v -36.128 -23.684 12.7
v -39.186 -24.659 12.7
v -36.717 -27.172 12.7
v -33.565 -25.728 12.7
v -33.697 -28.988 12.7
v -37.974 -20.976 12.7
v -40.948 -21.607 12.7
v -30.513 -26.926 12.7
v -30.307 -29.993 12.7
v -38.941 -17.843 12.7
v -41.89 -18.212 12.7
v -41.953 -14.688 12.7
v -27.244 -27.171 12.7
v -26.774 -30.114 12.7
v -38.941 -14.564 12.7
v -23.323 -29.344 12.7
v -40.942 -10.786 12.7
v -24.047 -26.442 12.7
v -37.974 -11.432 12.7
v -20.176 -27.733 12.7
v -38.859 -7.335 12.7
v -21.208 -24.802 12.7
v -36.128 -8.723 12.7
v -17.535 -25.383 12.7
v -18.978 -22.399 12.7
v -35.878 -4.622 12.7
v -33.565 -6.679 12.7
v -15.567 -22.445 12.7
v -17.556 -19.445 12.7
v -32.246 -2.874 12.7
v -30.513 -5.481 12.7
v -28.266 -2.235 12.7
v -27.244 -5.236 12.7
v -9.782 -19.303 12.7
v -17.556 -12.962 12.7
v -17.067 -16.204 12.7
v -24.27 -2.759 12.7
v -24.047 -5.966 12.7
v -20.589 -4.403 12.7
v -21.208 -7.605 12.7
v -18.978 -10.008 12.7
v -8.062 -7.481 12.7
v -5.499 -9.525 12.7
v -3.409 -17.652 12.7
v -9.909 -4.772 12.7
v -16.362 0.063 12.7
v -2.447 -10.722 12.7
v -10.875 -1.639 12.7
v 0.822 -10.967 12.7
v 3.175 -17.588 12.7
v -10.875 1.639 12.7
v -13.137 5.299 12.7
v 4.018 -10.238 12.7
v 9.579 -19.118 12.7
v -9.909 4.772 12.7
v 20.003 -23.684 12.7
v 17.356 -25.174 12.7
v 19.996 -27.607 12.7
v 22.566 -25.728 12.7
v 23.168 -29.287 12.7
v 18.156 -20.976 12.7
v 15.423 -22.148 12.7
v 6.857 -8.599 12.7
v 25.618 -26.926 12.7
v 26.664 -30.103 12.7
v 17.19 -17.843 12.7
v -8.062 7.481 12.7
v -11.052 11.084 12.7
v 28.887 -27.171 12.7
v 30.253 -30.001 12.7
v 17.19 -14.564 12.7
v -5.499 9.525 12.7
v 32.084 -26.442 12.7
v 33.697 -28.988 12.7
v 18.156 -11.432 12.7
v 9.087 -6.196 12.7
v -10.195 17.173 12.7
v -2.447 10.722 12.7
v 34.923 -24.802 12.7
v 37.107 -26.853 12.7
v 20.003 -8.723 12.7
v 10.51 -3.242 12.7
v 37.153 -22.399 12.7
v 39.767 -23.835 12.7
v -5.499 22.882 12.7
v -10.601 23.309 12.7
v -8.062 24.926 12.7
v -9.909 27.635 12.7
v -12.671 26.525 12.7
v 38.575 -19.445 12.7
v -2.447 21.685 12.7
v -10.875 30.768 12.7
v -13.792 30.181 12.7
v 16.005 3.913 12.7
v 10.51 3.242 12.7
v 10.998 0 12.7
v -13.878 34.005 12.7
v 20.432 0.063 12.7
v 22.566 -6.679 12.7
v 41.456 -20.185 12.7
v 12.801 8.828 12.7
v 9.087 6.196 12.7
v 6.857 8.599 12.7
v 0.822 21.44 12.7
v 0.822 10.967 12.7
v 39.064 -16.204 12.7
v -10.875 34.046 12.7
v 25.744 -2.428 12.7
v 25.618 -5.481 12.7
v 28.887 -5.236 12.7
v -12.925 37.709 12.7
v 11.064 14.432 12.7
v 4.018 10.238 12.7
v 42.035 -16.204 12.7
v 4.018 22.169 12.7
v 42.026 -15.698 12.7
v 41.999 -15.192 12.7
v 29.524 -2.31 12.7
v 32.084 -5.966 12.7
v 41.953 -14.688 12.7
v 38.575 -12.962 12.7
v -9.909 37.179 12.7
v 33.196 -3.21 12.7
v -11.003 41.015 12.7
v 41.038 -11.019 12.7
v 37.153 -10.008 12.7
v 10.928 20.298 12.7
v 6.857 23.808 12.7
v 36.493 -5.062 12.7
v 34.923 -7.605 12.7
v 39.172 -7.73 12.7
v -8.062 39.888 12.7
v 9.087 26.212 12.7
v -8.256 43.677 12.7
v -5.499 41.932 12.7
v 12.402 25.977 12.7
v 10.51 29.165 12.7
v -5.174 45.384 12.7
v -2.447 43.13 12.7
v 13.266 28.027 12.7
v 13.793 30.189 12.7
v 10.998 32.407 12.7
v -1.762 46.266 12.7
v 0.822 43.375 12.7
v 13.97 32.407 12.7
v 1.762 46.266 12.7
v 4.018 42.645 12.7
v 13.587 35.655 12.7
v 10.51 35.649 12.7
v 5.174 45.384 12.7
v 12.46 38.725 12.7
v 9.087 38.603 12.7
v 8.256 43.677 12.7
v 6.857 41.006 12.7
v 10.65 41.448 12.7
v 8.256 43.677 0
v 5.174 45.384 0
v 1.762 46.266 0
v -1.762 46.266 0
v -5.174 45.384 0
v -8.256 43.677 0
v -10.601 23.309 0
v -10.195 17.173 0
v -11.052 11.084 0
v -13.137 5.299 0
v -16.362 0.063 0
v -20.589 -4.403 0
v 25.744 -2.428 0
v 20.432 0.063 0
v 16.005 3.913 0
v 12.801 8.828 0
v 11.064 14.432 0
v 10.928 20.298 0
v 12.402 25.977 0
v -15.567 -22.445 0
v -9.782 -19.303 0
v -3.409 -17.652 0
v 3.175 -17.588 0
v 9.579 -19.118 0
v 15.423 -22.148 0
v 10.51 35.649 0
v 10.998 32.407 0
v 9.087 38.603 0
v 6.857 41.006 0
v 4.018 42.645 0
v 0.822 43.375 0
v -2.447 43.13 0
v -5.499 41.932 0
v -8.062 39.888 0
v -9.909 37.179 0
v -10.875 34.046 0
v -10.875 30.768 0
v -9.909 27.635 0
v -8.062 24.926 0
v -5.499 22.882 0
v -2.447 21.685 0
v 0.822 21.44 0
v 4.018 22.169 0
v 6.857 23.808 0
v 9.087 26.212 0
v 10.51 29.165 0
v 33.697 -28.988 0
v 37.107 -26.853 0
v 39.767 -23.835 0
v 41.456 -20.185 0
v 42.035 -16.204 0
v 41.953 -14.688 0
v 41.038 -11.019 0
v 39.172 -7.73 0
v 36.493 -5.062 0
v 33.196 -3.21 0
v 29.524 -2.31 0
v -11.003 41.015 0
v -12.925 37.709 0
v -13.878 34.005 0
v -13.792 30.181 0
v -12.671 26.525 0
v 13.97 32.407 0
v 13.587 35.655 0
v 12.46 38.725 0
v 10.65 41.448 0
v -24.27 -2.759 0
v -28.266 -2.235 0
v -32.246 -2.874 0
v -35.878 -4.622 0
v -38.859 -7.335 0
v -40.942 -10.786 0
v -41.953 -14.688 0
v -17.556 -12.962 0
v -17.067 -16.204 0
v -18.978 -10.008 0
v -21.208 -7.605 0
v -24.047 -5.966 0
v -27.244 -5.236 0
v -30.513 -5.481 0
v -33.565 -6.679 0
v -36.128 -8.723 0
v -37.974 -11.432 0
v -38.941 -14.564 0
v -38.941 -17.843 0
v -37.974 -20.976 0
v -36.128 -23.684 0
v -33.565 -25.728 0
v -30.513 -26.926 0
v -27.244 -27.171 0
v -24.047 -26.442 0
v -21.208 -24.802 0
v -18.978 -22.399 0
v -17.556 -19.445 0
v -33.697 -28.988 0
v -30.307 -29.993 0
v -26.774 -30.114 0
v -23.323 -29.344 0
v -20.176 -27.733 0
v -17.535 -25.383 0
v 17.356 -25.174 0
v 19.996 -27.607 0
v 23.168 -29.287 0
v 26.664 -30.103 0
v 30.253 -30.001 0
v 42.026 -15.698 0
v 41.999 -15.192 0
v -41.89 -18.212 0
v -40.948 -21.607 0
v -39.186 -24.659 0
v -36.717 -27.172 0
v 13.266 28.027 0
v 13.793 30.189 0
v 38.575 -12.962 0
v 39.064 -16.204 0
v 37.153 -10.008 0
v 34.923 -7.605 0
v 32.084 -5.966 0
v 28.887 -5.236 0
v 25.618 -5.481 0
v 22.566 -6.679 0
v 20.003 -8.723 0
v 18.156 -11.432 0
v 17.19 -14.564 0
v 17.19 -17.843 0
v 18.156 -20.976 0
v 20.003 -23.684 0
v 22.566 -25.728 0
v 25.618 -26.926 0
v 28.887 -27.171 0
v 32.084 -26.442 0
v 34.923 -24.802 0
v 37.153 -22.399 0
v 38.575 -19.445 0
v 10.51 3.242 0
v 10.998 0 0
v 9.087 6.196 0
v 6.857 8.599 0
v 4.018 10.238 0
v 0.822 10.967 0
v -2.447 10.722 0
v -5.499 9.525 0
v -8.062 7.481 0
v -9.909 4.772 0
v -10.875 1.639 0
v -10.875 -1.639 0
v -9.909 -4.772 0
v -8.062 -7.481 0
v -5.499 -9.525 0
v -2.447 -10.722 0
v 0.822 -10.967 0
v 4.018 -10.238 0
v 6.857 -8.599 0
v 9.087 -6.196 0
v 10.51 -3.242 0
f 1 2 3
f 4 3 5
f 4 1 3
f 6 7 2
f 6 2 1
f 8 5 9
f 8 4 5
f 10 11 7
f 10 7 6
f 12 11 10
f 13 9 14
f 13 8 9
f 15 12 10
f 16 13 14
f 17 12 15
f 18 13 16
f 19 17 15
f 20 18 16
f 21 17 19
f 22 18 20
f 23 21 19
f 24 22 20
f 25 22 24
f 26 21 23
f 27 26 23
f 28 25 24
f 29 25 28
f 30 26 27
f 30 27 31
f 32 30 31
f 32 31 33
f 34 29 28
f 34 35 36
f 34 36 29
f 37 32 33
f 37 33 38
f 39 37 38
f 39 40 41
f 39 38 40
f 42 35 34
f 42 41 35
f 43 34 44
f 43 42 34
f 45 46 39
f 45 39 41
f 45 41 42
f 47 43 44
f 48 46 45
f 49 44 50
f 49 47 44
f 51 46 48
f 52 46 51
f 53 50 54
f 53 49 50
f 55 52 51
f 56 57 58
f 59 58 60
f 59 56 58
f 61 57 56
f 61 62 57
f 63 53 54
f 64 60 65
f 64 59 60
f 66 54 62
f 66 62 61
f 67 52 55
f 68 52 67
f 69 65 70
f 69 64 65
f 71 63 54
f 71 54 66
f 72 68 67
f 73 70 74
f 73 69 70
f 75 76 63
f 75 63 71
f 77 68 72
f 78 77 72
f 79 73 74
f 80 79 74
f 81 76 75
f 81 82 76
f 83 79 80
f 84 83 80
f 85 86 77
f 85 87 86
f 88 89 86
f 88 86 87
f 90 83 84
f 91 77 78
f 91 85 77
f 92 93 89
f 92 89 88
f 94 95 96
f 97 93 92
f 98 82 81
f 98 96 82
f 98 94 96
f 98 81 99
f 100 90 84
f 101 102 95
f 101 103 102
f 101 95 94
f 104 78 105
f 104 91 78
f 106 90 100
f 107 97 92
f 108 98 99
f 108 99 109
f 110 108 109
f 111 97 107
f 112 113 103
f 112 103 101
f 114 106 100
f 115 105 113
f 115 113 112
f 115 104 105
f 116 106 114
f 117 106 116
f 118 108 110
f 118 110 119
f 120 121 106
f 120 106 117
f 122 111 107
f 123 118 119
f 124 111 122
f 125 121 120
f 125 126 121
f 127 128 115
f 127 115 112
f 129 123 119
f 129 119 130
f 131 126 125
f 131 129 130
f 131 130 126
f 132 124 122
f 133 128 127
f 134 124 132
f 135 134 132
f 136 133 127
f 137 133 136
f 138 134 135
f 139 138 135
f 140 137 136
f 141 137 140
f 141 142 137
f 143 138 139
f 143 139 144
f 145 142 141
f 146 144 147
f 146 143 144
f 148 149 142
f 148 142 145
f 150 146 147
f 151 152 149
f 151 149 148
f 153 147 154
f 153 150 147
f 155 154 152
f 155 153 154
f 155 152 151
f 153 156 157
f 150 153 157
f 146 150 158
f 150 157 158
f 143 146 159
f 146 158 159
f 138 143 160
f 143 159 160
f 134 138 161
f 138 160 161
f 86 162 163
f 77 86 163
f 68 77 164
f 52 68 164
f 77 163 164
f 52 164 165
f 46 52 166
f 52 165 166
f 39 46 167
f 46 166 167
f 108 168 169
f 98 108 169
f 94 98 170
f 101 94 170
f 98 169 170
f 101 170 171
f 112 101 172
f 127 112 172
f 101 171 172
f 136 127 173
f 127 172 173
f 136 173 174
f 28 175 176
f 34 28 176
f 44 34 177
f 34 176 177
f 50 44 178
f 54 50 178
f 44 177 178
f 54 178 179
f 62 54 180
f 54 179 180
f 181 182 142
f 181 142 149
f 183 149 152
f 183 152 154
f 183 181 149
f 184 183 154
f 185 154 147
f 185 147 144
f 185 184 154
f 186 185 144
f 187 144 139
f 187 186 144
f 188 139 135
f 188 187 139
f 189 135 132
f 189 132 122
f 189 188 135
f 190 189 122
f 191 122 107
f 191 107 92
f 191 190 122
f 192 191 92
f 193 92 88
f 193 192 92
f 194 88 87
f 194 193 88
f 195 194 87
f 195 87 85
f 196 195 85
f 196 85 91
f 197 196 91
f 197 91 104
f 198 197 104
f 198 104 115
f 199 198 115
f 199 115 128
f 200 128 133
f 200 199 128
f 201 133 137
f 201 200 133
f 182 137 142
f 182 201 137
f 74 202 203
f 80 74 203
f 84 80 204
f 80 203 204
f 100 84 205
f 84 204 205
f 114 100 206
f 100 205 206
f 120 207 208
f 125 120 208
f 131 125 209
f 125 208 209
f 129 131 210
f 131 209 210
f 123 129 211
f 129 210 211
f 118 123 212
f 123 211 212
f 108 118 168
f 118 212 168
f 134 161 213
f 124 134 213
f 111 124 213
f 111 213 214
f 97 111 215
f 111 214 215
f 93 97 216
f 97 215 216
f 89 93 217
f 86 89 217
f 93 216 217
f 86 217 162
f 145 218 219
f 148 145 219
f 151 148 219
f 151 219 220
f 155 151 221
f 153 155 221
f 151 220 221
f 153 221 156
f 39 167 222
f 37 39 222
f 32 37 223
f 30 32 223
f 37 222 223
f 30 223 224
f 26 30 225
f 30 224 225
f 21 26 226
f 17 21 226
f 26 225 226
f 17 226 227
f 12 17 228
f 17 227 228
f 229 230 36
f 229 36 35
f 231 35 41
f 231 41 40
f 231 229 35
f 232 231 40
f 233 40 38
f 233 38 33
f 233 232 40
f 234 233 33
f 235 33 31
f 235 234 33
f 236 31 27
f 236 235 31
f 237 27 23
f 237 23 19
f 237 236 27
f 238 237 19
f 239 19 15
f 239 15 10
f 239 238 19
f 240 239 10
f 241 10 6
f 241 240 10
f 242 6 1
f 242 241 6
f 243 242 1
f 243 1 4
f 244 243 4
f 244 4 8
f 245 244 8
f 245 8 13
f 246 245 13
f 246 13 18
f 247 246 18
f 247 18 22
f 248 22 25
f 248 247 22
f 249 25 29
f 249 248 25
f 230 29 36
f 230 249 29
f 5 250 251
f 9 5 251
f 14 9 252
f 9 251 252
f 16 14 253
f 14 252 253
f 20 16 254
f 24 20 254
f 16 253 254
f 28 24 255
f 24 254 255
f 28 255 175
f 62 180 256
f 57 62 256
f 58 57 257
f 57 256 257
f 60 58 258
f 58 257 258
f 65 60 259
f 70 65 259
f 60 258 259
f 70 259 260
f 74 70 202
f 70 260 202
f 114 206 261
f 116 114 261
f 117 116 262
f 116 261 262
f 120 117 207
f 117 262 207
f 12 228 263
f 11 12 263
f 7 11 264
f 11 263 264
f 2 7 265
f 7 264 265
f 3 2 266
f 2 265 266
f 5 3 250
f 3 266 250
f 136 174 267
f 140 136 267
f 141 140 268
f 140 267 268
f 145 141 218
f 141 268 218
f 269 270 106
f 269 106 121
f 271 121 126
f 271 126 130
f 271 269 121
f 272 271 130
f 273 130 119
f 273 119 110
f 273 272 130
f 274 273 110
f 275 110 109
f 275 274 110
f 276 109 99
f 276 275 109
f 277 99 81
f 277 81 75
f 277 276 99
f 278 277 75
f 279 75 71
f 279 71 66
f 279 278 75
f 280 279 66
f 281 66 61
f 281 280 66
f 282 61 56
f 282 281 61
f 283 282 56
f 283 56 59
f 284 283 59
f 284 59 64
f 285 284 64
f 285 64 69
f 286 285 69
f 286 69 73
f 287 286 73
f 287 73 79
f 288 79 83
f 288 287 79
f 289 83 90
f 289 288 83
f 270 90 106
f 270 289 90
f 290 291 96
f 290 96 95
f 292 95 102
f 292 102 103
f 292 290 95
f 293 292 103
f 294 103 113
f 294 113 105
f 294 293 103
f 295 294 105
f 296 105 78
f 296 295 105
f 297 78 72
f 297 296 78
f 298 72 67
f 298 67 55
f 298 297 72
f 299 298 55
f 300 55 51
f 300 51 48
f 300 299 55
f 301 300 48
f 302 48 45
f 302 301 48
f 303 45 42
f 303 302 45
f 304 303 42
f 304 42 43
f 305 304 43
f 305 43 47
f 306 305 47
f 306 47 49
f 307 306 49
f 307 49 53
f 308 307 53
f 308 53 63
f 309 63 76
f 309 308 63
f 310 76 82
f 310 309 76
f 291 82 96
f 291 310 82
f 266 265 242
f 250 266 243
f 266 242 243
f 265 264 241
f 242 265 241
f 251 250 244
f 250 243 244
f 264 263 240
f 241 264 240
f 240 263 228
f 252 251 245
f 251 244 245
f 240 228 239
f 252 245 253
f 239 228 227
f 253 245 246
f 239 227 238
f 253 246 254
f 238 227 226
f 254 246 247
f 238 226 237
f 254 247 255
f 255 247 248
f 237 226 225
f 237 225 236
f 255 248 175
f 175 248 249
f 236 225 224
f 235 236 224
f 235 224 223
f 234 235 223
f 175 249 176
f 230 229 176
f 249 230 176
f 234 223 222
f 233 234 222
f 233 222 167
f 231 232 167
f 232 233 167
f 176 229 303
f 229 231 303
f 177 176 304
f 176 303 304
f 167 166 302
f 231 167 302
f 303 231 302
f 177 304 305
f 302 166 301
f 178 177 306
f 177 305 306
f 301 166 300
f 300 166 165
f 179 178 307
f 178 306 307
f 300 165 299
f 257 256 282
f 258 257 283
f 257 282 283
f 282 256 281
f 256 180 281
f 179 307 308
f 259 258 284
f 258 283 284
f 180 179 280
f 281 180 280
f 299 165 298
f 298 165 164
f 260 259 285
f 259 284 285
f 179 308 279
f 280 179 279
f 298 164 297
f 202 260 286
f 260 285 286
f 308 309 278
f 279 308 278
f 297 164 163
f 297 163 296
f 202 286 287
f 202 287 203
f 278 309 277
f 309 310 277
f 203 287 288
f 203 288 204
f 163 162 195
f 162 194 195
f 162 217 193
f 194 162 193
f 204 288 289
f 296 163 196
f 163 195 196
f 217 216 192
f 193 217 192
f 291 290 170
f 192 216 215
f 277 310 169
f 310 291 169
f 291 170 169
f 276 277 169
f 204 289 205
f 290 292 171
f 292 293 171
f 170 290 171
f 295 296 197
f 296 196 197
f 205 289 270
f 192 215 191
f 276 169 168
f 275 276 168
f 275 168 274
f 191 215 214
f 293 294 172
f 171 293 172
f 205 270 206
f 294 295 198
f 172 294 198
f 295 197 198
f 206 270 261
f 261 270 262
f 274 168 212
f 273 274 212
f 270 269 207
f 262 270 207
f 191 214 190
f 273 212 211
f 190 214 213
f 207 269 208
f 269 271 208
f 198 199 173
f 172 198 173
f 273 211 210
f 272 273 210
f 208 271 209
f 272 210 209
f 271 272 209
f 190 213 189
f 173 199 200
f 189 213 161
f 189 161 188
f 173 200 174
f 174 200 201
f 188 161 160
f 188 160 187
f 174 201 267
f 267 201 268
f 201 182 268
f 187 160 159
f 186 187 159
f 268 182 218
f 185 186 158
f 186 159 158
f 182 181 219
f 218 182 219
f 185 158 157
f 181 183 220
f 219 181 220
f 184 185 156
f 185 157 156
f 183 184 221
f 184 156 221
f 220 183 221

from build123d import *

# Parameters (mm, degrees)
F0_R     = 10.9982
F0_R_2   = 13.97
F1_DEPTH = 12.7


with BuildPart() as f1:
    # F0 (on Top) → F1 (new body)
    with BuildSketch(Plane.XY):
        with BuildLine():
            ThreePointArc((13.97, 32.4071533978), (12.4598818148, 38.7247672797), (8.2560064193, 43.6765481466))
            ThreePointArc((8.2560064193, 43.6765481466), (0, 44.45), (-8.2560064193, 43.6765481466))
            ThreePointArc((-8.2560064193, 43.6765481466), (-13.8783328045, 34.0048951062), (-10.600858317, 23.3086533597))
            ThreePointArc((-10.600858317, 23.3086533597), (1.6096047371, 18.5301914612), (12.4020690853, 25.9767893021))
            ThreePointArc((12.4020690853, 25.9767893021), (13.5723580324, 29.097773178), (13.97, 32.4071533978))
        make_face()
        with Locations((0, 32.4071533978)):
            Circle(F0_R, mode=Mode.SUBTRACT)
        with BuildLine():
            ThreePointArc((-8.2560064193, 43.6765481466), (0, 44.45), (8.2560064193, 43.6765481466))
            ThreePointArc((8.2560064193, 43.6765481466), (0, 46.3771533978), (-8.2560064193, 43.6765481466))
        make_face()
        with BuildLine():
            ThreePointArc((42.0354181068, -16.2035766989), (42.0147992276, -15.4448499046), (41.9530034542, -14.6883627804))
            ThreePointArc((41.9530034542, -14.6883627804), (38.4948291982, -22.225), (33.696997035, -28.9881853662))
            ThreePointArc((33.696997035, -28.9881853662), (39.7665731273, -23.8353439377), (42.0354181068, -16.2035766989))
        make_face()
        with BuildLine():
            ThreePointArc((33.696997035, -28.9881853662), (38.4948291982, -22.225), (41.9530034542, -14.6883627804))
            ThreePointArc((41.9530034542, -14.6883627804), (36.4931838712, -5.0620478891), (25.7444185967, -2.4277333028))
            ThreePointArc((25.7444185967, -2.4277333028), (15.6881084253, -9.7256831332), (15.4233394109, -22.1482168264))
            ThreePointArc((15.4233394109, -22.1482168264), (23.1681669233, -29.287071295), (33.696997035, -28.9881853662))
        make_face()
        with Locations((28.0654181068, -16.2035766989)):
            Circle(F0_R, mode=Mode.SUBTRACT)
        with BuildLine():
            ThreePointArc((15.4233394109, -22.1482168264), (15.6881084253, -9.7256831332), (25.7444185967, -2.4277333028))
            ThreePointArc((25.7444185967, -2.4277333028), (12.8005092874, 8.8280600033), (12.4020690853, 25.9767893021))
            ThreePointArc((12.4020690853, 25.9767893021), (1.6096047371, 18.5301914612), (-10.600858317, 23.3086533597))
            ThreePointArc((-10.600858317, 23.3086533597), (-11.9457670792, 8.1377589695), (-20.5888732511, -4.4026370321))
            ThreePointArc((-20.5888732511, -4.4026370321), (-15.8259689437, -9.4688321468), (-14.0954181068, -16.2035766989))
            ThreePointArc((-14.0954181068, -16.2035766989), (-14.4683809608, -19.410051531), (-15.5673552362, -22.4453172))
            ThreePointArc((-15.5673552362, -22.4453172), (-0.1187696418, -17.419026699), (15.4233394109, -22.1482168264))
        make_face()
        Circle(F0_R_2, mode=Mode.SUBTRACT)
        with BuildLine():
            ThreePointArc((-20.5888732511, -4.4026370321), (-34.1254839966, -3.6164204906), (-41.9530034542, -14.6883627804))
            ThreePointArc((-41.9530034542, -14.6883627804), (-38.4948291982, -22.225), (-33.696997035, -28.9881853662))
            ThreePointArc((-33.696997035, -28.9881853662), (-23.3231157764, -29.3440283124), (-15.5673552362, -22.4453172))
            ThreePointArc((-15.5673552362, -22.4453172), (-14.4683809608, -19.410051531), (-14.0954181068, -16.2035766989))
            ThreePointArc((-14.0954181068, -16.2035766989), (-15.8259689437, -9.4688321468), (-20.5888732511, -4.4026370321))
        make_face()
        with Locations((-28.0654181068, -16.2035766989)):
            Circle(F0_R, mode=Mode.SUBTRACT)
        with BuildLine():
            ThreePointArc((-33.696997035, -28.9881853662), (-38.4948291982, -22.225), (-41.9530034542, -14.6883627804))
            ThreePointArc((-41.9530034542, -14.6883627804), (-40.1637929977, -23.1885766989), (-33.696997035, -28.9881853662))
        make_face()
        Circle(F0_R_2)
        Circle(F0_R, mode=Mode.SUBTRACT)
    extrude(amount=F1_DEPTH)


solid = f1.part
